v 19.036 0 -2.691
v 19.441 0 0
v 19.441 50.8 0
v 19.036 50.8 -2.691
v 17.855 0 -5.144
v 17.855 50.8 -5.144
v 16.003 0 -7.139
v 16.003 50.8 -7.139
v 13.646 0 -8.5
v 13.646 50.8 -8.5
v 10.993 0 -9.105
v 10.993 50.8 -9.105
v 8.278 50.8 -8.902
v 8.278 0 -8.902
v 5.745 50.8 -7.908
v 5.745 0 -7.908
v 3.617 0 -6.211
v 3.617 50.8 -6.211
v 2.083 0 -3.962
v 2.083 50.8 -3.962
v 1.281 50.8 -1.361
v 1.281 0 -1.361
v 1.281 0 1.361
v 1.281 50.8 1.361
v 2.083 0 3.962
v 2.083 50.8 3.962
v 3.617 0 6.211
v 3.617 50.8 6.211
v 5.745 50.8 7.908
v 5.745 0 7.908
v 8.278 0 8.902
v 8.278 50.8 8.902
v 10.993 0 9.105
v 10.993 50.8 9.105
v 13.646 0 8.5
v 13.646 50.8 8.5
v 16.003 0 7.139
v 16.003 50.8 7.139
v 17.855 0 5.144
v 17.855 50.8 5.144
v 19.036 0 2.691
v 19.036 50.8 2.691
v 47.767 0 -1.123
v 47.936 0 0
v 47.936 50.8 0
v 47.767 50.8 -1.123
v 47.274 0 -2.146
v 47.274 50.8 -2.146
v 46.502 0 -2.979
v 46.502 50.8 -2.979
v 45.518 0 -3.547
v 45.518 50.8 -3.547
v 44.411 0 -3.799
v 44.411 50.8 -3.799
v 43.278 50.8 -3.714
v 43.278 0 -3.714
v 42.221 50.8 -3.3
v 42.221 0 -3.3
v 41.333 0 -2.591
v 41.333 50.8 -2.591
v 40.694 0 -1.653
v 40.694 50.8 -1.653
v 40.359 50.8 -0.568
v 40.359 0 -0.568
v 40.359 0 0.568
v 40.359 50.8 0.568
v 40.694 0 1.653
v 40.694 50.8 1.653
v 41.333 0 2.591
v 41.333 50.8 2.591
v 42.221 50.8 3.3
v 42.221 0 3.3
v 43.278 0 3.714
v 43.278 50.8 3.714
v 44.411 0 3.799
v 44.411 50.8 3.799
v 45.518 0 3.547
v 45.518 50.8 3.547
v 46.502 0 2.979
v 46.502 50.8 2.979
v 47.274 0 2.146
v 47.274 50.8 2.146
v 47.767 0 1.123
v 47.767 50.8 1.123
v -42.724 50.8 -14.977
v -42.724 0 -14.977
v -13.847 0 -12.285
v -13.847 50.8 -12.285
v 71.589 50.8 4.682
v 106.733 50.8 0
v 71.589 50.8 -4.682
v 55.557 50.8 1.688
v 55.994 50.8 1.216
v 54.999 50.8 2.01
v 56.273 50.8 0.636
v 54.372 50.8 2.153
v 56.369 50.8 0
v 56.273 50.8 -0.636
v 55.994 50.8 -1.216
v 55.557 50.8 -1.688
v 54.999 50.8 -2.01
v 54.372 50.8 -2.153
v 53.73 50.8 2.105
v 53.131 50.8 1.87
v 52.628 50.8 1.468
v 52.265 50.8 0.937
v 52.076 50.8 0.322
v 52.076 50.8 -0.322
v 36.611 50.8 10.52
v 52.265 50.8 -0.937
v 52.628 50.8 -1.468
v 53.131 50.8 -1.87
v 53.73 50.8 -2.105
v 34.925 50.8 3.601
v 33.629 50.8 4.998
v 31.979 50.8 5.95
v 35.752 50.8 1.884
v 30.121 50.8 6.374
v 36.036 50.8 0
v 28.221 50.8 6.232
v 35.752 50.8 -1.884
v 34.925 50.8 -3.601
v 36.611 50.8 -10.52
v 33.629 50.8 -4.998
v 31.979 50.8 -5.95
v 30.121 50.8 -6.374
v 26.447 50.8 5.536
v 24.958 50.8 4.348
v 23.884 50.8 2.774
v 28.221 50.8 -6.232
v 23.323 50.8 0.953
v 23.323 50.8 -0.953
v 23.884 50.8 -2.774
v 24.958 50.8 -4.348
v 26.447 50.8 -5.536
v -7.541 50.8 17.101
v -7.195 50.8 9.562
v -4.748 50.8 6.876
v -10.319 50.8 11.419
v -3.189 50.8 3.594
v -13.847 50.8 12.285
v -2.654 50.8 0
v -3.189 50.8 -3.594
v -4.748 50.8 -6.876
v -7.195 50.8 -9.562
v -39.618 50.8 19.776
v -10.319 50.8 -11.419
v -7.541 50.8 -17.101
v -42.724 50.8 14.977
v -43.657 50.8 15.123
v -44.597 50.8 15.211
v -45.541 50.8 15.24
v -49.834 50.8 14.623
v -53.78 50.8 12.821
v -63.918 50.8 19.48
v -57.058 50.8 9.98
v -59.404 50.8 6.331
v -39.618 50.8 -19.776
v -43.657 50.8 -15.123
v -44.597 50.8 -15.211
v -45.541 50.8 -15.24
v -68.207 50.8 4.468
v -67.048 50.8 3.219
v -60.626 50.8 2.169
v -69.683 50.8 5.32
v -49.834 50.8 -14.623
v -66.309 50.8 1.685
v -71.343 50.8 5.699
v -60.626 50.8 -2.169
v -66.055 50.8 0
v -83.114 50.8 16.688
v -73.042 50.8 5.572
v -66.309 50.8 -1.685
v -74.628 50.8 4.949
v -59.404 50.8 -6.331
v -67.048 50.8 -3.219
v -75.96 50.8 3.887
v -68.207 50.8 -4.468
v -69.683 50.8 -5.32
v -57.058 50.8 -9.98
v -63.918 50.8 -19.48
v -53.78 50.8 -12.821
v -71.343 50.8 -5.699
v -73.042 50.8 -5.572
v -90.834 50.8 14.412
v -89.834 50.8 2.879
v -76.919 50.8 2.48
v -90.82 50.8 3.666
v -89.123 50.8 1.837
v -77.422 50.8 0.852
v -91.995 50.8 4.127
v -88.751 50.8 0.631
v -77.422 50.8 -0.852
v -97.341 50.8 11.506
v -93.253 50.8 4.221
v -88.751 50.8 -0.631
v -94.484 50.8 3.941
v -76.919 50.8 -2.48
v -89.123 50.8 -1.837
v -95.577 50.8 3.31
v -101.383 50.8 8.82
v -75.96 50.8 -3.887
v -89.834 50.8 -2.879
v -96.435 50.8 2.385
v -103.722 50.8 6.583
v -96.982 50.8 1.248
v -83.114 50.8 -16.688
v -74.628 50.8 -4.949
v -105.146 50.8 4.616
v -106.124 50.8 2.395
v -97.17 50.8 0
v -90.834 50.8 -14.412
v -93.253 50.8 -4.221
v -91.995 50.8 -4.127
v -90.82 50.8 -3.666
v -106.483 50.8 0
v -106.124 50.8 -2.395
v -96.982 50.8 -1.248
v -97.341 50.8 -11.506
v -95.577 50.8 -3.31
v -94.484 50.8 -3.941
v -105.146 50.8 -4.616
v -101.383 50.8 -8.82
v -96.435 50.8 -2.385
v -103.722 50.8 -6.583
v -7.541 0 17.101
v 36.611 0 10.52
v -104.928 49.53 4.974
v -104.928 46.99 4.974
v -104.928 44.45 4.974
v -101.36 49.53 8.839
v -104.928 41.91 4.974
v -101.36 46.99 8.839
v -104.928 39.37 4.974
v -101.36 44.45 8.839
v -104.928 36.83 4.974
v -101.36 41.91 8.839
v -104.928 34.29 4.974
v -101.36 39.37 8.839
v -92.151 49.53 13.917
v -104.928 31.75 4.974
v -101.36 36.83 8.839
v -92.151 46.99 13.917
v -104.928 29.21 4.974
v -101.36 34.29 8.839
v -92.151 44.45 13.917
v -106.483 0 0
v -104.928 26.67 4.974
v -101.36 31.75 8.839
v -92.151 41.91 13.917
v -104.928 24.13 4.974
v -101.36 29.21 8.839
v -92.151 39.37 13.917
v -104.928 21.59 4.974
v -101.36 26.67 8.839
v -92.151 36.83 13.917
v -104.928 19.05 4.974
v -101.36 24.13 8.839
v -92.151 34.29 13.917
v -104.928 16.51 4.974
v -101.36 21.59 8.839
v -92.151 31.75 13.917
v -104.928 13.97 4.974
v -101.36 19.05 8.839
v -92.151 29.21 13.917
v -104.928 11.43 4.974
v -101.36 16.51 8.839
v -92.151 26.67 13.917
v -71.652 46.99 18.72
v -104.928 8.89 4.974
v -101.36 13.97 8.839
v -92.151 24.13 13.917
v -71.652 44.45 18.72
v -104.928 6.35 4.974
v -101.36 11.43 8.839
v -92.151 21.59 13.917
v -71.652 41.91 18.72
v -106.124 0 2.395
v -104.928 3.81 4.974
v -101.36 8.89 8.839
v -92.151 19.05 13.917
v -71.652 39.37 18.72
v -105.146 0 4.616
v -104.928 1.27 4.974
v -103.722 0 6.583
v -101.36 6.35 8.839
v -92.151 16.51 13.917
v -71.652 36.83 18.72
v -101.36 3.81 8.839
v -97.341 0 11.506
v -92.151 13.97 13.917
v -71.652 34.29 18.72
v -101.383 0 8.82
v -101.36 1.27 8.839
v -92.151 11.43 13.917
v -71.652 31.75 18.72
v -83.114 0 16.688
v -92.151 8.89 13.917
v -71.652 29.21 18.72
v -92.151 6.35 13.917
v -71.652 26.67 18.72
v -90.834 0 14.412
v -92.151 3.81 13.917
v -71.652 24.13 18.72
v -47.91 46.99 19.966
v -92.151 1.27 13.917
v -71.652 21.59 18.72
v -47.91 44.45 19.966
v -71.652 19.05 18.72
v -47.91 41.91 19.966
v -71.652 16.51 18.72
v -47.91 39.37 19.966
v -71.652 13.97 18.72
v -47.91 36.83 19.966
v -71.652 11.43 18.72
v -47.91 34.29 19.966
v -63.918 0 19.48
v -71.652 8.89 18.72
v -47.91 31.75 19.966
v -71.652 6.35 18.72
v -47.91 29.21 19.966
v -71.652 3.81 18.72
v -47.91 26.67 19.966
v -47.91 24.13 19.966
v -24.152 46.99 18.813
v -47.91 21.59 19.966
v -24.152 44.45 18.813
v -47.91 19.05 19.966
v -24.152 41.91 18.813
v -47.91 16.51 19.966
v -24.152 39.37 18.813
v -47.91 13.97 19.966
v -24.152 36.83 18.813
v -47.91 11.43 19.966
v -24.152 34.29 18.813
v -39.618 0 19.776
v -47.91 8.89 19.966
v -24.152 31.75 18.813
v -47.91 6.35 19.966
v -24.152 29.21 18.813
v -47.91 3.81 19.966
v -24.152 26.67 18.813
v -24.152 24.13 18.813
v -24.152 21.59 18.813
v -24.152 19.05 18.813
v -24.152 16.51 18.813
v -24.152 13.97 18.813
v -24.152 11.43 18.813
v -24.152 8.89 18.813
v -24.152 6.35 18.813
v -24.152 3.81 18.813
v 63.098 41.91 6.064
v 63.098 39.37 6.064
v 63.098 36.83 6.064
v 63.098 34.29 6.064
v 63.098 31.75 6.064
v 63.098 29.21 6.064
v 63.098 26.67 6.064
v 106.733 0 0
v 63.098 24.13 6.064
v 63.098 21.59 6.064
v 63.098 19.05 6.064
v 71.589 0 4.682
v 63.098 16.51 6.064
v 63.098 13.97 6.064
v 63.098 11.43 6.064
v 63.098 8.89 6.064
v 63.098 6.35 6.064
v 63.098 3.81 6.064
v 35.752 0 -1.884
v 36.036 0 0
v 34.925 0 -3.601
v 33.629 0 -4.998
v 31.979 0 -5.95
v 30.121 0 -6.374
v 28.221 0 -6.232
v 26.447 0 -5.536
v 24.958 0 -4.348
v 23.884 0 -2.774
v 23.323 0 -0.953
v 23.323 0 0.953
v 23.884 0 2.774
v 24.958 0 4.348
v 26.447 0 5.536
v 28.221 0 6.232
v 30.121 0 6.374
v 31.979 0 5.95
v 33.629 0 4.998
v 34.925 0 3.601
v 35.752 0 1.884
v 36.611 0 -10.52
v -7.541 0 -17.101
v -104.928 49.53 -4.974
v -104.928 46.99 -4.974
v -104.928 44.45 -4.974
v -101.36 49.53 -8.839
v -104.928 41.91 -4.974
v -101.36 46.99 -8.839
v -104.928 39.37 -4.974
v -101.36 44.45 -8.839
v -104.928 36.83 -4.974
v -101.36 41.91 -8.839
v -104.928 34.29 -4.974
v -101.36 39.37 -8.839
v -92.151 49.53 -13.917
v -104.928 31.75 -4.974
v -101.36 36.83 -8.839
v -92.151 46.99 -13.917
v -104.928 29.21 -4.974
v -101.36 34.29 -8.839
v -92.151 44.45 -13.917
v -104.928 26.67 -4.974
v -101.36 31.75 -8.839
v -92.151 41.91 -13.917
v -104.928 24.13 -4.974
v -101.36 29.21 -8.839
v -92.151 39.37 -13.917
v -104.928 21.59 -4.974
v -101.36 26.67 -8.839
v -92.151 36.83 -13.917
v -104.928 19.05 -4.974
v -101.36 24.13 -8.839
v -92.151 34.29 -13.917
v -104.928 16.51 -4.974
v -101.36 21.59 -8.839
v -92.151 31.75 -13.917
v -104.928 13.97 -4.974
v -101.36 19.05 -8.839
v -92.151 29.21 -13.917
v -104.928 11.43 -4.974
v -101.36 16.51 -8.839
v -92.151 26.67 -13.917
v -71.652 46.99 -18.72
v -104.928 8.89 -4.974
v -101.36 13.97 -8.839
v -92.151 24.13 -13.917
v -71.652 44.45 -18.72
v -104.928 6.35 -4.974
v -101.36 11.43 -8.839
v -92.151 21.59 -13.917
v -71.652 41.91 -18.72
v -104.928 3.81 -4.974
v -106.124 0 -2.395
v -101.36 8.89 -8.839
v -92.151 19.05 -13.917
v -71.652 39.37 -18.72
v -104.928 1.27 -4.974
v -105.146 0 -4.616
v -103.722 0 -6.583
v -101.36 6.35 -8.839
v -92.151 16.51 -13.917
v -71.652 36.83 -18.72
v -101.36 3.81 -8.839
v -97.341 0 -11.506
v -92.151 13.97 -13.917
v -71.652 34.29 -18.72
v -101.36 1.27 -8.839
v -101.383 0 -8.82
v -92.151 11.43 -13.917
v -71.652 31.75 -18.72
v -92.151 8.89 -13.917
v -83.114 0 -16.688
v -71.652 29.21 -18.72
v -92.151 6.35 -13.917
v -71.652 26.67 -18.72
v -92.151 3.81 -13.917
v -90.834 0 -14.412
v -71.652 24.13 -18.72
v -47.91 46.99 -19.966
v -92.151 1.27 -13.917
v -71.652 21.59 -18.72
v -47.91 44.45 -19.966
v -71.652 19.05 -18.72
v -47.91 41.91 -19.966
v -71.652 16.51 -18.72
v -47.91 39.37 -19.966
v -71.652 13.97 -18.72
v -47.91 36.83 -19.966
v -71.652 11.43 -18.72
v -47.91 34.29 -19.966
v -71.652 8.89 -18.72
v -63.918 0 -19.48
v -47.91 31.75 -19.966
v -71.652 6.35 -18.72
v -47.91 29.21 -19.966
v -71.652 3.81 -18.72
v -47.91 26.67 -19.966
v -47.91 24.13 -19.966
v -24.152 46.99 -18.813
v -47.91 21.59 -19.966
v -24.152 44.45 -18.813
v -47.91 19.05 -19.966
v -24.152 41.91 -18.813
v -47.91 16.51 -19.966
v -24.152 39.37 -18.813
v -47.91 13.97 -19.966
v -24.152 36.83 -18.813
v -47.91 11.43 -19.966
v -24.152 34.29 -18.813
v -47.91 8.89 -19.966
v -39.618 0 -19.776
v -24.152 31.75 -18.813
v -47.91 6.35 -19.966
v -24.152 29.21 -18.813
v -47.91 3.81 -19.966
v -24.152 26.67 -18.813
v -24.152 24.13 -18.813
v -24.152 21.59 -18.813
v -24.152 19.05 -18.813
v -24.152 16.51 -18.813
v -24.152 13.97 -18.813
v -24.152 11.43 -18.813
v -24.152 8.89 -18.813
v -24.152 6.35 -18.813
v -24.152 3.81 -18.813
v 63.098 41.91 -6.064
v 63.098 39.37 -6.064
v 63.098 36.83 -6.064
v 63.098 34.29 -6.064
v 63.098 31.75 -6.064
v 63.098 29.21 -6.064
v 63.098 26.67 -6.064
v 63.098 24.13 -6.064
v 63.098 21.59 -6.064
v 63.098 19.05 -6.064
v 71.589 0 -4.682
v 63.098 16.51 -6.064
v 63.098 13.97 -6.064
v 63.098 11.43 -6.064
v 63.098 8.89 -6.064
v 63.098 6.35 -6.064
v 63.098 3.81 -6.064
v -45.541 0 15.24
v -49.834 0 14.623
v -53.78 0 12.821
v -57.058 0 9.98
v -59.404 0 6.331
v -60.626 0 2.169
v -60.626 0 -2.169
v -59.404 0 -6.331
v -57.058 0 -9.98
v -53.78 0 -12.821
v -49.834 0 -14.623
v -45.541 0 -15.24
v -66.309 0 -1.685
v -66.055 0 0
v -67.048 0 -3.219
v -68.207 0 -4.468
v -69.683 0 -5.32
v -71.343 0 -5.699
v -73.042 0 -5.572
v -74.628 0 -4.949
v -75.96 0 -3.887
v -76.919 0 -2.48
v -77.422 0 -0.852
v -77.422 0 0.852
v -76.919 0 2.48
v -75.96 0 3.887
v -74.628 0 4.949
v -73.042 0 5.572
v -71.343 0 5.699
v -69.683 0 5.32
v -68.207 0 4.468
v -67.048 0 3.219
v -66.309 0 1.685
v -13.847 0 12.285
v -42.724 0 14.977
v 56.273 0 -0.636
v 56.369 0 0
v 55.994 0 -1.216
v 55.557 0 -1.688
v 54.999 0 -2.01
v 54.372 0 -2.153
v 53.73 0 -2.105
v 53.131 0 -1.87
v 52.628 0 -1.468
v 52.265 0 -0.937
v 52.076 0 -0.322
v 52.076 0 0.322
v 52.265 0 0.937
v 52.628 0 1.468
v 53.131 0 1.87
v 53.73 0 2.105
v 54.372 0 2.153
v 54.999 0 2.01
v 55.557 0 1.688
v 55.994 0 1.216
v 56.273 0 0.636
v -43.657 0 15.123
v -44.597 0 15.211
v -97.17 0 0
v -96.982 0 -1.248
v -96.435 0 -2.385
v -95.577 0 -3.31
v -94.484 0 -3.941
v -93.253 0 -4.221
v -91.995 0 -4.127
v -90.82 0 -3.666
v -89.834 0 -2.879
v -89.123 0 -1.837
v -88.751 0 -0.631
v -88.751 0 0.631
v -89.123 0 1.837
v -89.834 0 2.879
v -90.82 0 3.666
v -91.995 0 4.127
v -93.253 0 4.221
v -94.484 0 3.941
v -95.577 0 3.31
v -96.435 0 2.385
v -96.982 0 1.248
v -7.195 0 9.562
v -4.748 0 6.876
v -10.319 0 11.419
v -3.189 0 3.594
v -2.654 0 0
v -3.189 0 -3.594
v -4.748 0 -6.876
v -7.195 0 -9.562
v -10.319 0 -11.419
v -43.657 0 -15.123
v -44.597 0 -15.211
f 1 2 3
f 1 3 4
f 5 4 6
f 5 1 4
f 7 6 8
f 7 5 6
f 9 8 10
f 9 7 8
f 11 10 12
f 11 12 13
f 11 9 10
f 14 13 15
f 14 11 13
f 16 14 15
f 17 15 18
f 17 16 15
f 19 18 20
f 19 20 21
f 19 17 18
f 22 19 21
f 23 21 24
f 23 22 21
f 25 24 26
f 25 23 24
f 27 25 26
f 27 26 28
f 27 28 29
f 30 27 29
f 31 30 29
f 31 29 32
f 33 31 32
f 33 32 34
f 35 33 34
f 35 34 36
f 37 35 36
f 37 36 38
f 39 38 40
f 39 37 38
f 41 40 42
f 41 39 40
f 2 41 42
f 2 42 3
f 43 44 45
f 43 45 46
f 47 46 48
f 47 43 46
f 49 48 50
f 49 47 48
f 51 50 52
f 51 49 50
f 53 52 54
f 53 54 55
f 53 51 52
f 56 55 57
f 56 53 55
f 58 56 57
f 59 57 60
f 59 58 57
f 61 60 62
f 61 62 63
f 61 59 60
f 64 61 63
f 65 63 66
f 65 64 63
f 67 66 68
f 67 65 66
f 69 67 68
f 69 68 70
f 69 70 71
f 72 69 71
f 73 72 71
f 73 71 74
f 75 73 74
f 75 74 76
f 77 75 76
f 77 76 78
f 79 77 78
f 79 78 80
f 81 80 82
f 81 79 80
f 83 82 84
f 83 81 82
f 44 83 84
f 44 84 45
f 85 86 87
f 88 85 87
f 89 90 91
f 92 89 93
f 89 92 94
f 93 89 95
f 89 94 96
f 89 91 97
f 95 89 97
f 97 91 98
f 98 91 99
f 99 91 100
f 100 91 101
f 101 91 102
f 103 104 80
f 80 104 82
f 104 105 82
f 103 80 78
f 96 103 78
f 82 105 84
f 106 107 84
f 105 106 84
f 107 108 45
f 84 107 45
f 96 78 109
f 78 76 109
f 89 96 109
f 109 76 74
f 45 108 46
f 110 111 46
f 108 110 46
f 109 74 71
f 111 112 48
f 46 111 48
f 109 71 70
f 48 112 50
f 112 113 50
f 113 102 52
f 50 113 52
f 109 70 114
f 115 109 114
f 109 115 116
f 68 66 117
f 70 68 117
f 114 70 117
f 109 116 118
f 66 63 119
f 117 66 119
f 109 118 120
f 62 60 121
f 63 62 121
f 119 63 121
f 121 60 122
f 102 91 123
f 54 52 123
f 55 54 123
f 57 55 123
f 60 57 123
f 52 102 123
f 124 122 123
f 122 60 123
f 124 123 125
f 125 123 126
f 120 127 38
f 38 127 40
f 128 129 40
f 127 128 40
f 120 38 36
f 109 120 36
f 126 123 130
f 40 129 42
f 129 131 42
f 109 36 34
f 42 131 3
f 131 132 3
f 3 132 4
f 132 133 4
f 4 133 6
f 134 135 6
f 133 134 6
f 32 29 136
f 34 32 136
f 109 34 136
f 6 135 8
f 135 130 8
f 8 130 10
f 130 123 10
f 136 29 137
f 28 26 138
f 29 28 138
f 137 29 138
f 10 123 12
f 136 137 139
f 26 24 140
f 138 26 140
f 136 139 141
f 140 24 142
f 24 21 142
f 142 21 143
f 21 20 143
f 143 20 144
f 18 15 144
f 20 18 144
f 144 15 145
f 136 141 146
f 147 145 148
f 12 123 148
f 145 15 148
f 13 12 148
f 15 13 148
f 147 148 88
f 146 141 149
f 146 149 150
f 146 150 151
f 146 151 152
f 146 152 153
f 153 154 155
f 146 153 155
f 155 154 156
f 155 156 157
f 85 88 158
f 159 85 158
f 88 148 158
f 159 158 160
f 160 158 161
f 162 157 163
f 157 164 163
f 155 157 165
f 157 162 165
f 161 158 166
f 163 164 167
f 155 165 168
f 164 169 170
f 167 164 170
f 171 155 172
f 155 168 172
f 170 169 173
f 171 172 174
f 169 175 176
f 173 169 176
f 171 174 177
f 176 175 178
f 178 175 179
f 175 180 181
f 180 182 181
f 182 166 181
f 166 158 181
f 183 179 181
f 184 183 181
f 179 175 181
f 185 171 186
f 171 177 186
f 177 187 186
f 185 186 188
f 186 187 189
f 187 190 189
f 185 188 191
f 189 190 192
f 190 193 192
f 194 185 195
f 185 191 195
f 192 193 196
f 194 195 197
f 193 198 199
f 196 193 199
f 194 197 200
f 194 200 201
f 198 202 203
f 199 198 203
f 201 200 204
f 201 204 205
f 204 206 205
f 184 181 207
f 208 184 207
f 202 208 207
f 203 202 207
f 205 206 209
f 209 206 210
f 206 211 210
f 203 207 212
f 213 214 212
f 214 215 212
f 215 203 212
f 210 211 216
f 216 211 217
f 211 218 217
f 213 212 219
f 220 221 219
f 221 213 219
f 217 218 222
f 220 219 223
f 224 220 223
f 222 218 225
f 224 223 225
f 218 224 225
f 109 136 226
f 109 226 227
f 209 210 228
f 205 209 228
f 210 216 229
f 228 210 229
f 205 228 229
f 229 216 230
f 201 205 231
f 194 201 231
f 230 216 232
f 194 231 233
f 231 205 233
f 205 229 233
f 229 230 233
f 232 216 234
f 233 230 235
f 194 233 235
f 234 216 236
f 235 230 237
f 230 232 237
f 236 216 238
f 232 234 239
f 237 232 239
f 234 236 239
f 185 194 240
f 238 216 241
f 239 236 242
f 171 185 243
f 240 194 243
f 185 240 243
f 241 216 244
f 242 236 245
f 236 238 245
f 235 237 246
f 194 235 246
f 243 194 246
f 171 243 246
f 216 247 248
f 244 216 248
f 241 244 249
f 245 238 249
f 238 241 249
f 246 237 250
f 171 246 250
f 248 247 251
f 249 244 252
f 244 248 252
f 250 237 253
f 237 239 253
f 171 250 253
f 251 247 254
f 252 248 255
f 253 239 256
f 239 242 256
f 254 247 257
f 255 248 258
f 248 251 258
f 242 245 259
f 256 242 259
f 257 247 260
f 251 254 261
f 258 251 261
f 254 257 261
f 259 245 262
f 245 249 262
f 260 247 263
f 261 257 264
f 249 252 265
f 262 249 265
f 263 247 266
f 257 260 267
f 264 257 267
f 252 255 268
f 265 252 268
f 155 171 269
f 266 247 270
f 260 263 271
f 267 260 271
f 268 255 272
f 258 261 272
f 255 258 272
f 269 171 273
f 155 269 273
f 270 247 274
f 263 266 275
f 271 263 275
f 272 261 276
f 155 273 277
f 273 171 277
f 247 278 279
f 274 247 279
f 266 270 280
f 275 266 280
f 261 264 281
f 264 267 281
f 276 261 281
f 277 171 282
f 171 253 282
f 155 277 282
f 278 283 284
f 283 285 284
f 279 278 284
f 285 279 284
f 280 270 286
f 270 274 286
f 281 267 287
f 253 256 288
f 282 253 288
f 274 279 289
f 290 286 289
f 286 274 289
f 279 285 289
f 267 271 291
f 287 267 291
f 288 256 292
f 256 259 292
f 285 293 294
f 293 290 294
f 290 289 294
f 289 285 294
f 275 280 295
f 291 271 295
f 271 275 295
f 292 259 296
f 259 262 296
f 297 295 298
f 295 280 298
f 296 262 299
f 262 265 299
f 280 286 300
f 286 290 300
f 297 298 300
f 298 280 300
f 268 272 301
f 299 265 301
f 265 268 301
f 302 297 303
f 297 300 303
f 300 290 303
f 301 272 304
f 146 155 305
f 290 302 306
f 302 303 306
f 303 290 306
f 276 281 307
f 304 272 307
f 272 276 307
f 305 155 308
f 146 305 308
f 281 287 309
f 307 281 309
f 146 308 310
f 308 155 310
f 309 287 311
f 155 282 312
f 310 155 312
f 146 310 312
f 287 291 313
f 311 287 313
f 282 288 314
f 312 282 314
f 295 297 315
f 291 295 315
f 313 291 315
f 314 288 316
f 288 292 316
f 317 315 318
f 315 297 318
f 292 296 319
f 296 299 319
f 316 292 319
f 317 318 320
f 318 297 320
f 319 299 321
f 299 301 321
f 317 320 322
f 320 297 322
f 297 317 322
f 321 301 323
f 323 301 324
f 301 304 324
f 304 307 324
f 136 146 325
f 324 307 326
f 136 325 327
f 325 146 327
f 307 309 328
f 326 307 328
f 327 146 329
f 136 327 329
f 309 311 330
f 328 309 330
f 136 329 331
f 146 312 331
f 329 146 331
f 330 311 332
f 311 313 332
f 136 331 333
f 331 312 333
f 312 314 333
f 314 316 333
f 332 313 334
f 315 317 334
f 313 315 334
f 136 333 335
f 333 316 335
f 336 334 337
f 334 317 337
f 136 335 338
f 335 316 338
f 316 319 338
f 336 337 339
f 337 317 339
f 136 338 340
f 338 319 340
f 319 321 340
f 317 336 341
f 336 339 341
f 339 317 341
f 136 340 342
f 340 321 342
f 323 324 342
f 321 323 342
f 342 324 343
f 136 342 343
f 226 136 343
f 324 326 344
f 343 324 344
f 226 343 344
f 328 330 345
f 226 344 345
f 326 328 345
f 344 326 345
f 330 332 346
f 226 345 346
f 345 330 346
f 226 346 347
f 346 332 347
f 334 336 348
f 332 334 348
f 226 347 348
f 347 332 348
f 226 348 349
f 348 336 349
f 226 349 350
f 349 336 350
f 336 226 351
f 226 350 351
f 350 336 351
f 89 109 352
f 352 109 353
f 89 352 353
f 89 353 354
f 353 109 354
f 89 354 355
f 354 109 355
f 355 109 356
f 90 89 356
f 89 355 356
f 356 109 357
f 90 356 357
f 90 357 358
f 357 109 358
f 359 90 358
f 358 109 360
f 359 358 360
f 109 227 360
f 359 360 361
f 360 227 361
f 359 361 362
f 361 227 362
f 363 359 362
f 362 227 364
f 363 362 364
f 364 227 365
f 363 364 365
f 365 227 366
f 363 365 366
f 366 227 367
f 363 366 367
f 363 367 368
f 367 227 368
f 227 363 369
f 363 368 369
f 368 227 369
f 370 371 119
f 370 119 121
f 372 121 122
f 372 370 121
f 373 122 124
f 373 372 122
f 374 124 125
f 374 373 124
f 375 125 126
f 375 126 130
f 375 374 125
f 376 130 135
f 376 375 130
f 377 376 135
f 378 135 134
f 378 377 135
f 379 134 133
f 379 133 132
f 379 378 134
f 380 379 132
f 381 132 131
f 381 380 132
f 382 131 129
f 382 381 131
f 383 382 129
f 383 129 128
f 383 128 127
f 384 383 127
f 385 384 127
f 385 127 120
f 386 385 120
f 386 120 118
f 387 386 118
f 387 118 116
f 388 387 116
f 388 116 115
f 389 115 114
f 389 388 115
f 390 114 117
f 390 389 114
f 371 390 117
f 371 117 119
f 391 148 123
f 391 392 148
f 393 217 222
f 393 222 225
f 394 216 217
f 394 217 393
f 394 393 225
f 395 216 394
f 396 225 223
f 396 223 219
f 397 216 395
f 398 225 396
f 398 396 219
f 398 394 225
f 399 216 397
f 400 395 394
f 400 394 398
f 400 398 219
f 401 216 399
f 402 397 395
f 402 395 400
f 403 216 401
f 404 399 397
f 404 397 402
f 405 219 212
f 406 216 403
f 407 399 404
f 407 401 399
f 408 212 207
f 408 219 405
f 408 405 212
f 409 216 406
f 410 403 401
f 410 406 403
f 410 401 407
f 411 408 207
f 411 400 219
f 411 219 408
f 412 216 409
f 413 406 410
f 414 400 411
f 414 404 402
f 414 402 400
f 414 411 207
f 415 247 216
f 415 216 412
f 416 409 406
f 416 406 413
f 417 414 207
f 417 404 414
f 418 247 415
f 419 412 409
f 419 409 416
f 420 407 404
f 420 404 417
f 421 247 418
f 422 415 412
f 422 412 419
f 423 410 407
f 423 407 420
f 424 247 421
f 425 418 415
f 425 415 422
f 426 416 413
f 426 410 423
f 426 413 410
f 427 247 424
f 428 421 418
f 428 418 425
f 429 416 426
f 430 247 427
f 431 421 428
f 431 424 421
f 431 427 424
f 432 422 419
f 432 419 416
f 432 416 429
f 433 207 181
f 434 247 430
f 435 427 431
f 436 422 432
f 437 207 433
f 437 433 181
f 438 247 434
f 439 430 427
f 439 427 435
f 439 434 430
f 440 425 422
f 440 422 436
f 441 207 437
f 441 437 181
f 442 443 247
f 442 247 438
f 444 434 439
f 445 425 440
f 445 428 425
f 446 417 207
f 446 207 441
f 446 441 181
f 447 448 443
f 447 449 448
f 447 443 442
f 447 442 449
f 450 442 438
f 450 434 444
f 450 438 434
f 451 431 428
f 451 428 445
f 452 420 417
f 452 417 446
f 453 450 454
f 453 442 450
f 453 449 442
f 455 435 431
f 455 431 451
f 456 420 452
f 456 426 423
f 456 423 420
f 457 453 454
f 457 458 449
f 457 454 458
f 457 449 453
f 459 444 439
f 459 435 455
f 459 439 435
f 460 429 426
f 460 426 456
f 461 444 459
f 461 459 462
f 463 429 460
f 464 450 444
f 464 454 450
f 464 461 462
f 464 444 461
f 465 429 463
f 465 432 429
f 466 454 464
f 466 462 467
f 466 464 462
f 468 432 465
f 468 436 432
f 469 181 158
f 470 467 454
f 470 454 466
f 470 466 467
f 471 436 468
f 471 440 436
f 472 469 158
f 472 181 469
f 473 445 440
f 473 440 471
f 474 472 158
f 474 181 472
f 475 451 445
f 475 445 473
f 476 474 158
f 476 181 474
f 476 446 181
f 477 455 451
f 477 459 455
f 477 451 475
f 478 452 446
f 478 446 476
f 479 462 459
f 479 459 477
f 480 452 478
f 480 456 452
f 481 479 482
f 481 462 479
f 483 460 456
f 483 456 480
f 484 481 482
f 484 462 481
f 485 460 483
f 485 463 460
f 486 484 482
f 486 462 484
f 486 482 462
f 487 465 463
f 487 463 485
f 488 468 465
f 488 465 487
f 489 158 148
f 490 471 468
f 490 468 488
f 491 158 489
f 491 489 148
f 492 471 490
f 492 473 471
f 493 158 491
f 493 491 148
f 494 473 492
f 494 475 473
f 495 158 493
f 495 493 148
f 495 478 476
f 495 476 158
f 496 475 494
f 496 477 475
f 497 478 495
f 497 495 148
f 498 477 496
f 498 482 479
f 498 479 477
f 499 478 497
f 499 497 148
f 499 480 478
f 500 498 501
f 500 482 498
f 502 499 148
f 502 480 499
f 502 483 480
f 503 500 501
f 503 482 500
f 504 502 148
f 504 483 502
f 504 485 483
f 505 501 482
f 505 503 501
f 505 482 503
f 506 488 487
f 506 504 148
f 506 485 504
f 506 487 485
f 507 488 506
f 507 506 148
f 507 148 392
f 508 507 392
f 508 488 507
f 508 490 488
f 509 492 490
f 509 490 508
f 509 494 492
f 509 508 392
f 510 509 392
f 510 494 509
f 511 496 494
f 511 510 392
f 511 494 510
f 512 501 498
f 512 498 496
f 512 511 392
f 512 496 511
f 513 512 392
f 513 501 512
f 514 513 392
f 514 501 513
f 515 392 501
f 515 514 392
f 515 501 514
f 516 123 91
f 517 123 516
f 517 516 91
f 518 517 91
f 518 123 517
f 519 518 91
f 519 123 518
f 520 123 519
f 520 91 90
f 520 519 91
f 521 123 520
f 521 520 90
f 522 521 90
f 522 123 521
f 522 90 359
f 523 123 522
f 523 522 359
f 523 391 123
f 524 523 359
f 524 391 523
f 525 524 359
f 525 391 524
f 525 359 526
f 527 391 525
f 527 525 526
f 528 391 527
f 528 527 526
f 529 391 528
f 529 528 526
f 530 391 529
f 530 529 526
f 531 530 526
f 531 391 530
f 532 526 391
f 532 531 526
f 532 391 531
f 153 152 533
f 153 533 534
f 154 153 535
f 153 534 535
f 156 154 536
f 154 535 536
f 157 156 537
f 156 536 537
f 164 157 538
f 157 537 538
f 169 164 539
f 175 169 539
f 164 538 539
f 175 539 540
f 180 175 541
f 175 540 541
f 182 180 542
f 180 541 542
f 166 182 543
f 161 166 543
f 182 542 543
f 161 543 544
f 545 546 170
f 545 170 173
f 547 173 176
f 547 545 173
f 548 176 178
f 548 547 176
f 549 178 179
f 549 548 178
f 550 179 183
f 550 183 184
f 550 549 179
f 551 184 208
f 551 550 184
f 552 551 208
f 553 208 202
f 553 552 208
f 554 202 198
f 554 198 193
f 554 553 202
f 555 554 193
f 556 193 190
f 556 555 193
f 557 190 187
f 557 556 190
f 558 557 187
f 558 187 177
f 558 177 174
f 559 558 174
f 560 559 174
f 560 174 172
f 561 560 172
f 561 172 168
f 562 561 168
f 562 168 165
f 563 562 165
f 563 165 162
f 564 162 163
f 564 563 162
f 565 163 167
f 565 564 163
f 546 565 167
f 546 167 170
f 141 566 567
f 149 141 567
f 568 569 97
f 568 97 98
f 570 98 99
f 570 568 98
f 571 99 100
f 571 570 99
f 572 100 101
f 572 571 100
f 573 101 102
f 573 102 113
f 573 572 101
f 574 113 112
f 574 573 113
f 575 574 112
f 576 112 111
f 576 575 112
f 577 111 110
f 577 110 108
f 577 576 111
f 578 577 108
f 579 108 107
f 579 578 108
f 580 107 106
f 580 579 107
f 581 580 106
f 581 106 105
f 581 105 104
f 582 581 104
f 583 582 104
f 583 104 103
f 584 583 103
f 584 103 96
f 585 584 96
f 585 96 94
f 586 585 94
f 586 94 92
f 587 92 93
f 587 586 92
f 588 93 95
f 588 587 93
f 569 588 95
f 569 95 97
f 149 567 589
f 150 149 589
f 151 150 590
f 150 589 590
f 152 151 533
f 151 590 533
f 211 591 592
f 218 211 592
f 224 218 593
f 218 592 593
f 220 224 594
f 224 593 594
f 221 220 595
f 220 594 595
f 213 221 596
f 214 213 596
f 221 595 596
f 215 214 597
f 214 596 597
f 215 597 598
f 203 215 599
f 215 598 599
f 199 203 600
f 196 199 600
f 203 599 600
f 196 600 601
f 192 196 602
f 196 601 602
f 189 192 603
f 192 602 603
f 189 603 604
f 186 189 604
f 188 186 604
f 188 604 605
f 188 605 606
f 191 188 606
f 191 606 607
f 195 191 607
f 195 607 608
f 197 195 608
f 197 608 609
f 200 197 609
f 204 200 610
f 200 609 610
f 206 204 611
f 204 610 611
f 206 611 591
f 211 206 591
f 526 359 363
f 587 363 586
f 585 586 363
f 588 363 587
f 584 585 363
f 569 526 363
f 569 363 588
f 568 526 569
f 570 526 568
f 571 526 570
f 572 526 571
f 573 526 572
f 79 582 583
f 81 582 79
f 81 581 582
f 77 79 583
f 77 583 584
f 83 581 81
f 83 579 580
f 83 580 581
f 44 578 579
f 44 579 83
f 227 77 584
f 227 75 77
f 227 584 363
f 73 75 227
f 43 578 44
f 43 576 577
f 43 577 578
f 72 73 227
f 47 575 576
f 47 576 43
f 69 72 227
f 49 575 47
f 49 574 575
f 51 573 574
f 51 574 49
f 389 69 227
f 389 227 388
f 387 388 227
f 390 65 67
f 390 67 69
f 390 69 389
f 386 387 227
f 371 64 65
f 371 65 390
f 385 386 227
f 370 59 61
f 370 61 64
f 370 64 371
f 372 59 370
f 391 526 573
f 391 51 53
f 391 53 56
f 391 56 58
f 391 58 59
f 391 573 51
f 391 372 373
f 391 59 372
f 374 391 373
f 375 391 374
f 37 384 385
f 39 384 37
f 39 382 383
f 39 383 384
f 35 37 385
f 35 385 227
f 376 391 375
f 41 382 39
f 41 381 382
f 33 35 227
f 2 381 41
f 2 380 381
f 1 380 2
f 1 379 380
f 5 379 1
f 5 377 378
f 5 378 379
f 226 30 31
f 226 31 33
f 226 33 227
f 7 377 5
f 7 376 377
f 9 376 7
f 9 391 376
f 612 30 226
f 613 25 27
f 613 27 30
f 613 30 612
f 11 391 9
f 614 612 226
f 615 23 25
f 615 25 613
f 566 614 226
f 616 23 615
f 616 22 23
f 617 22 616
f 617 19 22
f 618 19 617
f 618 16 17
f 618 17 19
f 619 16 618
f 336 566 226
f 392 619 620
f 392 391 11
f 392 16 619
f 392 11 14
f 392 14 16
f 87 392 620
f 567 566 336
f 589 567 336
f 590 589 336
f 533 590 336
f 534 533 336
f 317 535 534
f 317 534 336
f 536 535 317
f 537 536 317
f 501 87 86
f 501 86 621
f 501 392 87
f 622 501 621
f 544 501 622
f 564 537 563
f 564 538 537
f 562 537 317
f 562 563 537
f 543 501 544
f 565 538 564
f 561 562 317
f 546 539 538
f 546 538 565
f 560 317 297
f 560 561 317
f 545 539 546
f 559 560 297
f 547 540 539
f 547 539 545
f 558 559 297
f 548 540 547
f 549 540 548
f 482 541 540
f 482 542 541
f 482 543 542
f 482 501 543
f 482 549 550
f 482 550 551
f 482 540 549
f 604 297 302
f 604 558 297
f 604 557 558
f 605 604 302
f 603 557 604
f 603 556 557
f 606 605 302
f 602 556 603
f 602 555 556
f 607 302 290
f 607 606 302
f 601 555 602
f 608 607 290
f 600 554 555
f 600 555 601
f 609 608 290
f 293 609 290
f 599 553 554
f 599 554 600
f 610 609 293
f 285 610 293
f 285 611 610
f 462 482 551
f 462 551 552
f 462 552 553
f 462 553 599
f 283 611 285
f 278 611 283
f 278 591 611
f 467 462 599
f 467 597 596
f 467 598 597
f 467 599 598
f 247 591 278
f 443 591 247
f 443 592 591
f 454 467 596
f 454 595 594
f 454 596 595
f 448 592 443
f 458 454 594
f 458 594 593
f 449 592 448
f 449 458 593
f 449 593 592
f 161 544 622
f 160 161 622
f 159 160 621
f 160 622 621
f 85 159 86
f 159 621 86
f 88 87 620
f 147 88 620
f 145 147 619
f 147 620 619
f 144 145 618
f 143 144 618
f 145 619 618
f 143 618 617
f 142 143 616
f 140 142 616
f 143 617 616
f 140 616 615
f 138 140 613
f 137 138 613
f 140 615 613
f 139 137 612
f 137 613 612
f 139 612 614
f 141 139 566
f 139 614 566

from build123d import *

# Parameters (mm, degrees)
SKETCH1_R           = 5.715
SKETCH1_R_2         = 9.131011462
SKETCH1_R_3         = 6.392333333
SKETCH1_R_4         = 3.81
SKETCH1_R_5         = 2.159
BOSS_EXTRUDE1_DEPTH = 50.8


with BuildPart() as part:
    # Sketch1 → Boss-Extrude1 (new body)
    with BuildSketch(Plane(origin=(0, 0, 0), x_dir=(1, 0, 0), z_dir=(0, 1, 0))):
        with BuildLine():
            add(Edge.make_bspline(
                [(-106.482983395, 7e-09), (-106.481988205, 0.336221447), (-106.427915569, 1.172470852), (-106.105951464, 2.643099269), (-105.314009735, 4.475217408), (-103.897531119, 6.504348419), (-101.808045378, 8.571651332), (-99.066717841, 10.567556704), (-95.719803188, 12.4267473), (-91.817332429, 14.111441711), (-87.406701835, 15.599318162), (-82.531907012, 16.877133323), (-77.234149654, 17.93743562), (-71.552607098, 18.776740572), (-65.525147606, 19.395460586), (-59.188591418, 19.79657403), (-52.57905308, 19.986276316), (-45.732001964, 19.972865837), (-38.682363694, 19.76732247), (-31.464522928, 19.382552478), (-24.112335149, 18.833317467), (-16.659115821, 18.136000968), (-9.137634043, 17.308302017), (-1.580112881, 16.368906014), (5.98177291, 15.337213534), (13.516891029, 14.232999407), (20.994645609, 13.076129848), (28.384968739, 11.886210001), (35.658323251, 10.682336314), (42.785702907, 9.482759124), (49.738647425, 8.304637787), (56.489265684, 7.163760718), (63.010281114, 6.074356699), (69.275076728, 5.048841412), (75.257781106, 4.097692071), (80.933343311, 3.229317249), (86.277669376, 2.449846213), (91.267618323, 1.763292049), (95.881607116, 1.17122476), (100.098099776, 0.673119164), (103.673185129, 0.290516392), (105.83614122, 0.081745654), (106.733370691, 7e-09)],
                knots=[0.5, 0.5, 0.5, 0.5, 0.502166769, 0.505390167, 0.509655974, 0.514947682, 0.521244711, 0.528520886, 0.536744945, 0.54588136, 0.555890751, 0.566730119, 0.57835299, 0.590709588, 0.603747039, 0.617409572, 0.631638768, 0.646373793, 0.661551658, 0.677107483, 0.692974771, 0.709085713, 0.725371443, 0.741762353, 0.758188398, 0.774579367, 0.790865214, 0.806976332, 0.822843867, 0.838400002, 0.853578262, 0.868313774, 0.882543568, 0.896206835, 0.909245173, 0.92160287, 0.933227116, 0.944068236, 0.954079898, 0.963219316, 0.971447445, 0.977251074, 0.977251074, 0.977251074, 0.977251074], degree=3))
            add(Edge.make_bspline(
                [(-106.482983395, -7e-09), (-106.481988205, -0.336221447), (-106.427915569, -1.172470852), (-106.105951463, -2.643099269), (-105.314009735, -4.475217408), (-103.897531118, -6.504348419), (-101.808045378, -8.571651332), (-99.06671784, -10.567556704), (-95.719803188, -12.4267473), (-91.817332429, -14.111441711), (-87.406701835, -15.599318162), (-82.531907011, -16.877133323), (-77.234149654, -17.93743562), (-71.552607098, -18.776740572), (-65.525147605, -19.395460586), (-59.188591417, -19.79657403), (-52.57905308, -19.986276316), (-45.732001964, -19.972865837), (-38.682363694, -19.76732247), (-31.464522928, -19.382552478), (-24.112335148, -18.833317467), (-16.659115821, -18.136000968), (-9.137634043, -17.308302017), (-1.580112881, -16.368906014), (5.98177291, -15.337213534), (13.516891029, -14.232999407), (20.99464561, -13.076129848), (28.384968739, -11.886210001), (35.658323251, -10.682336314), (42.785702907, -9.482759124), (49.738647426, -8.304637787), (56.489265684, -7.163760718), (63.010281115, -6.074356699), (69.275076728, -5.048841412), (75.257781106, -4.097692071), (80.933343311, -3.229317249), (86.277669376, -2.449846213), (91.267618323, -1.763292049), (95.881607116, -1.17122476), (100.098099776, -0.673119164), (103.673185129, -0.290516392), (105.83614122, -0.081745654), (106.733370691, -7e-09)],
                knots=[0.5, 0.5, 0.5, 0.5, 0.502166769, 0.505390167, 0.509655974, 0.514947682, 0.521244711, 0.528520886, 0.536744945, 0.54588136, 0.555890751, 0.566730119, 0.57835299, 0.590709588, 0.603747039, 0.617409572, 0.631638768, 0.646373793, 0.661551658, 0.677107483, 0.692974771, 0.709085713, 0.725371443, 0.741762353, 0.758188398, 0.774579367, 0.790865214, 0.806976332, 0.822843867, 0.838400002, 0.853578262, 0.868313774, 0.882543568, 0.896206835, 0.909245173, 0.92160287, 0.933227116, 0.944068236, 0.954079898, 0.963219316, 0.971447445, 0.977251074, 0.977251074, 0.977251074, 0.977251074], degree=3))
        make_face()
        with BuildLine():
            ThreePointArc((-88.703779951, 0), (-92.937113284, -4.233333333), (-97.170446617, 0))
            ThreePointArc((-97.170446617, 0), (-92.937113284, 4.233333333), (-88.703779951, 0))
        make_face(mode=Mode.SUBTRACT)
        with Locations((-71.77044662, 0)):
            Circle(SKETCH1_R, mode=Mode.SUBTRACT)
        with BuildLine():
            ThreePointArc((-45.540838593, -15.24), (-60.780838593, 0), (-45.540838593, 15.24))
            ThreePointArc((-45.540838593, 15.24), (-44.126098565, 15.174192257), (-42.723576496, 14.977337356))
            Line((-42.723576496, 14.977337356), (-13.847320134, 12.285108666))
            ThreePointArc((-13.847320134, 12.285108666), (-2.65431439, 0), (-13.847320134, -12.285108666))
            Line((-13.847320134, -12.285108666), (-42.723576496, -14.977337356))
            ThreePointArc((-42.723576496, -14.977337356), (-44.126098565, -15.174192257), (-45.540838593, -15.24))
        make_face(mode=Mode.SUBTRACT)
        with Locations((10.310172634, 0)):
            Circle(SKETCH1_R_2, mode=Mode.SUBTRACT)
        with Locations((29.643517429, 0)):
            Circle(SKETCH1_R_3, mode=Mode.SUBTRACT)
        with Locations((44.126269567, 0)):
            Circle(SKETCH1_R_4, mode=Mode.SUBTRACT)
        with Locations((54.210398224, 0)):
            Circle(SKETCH1_R_5, mode=Mode.SUBTRACT)
    extrude(amount=BOSS_EXTRUDE1_DEPTH)


solid = part.part
